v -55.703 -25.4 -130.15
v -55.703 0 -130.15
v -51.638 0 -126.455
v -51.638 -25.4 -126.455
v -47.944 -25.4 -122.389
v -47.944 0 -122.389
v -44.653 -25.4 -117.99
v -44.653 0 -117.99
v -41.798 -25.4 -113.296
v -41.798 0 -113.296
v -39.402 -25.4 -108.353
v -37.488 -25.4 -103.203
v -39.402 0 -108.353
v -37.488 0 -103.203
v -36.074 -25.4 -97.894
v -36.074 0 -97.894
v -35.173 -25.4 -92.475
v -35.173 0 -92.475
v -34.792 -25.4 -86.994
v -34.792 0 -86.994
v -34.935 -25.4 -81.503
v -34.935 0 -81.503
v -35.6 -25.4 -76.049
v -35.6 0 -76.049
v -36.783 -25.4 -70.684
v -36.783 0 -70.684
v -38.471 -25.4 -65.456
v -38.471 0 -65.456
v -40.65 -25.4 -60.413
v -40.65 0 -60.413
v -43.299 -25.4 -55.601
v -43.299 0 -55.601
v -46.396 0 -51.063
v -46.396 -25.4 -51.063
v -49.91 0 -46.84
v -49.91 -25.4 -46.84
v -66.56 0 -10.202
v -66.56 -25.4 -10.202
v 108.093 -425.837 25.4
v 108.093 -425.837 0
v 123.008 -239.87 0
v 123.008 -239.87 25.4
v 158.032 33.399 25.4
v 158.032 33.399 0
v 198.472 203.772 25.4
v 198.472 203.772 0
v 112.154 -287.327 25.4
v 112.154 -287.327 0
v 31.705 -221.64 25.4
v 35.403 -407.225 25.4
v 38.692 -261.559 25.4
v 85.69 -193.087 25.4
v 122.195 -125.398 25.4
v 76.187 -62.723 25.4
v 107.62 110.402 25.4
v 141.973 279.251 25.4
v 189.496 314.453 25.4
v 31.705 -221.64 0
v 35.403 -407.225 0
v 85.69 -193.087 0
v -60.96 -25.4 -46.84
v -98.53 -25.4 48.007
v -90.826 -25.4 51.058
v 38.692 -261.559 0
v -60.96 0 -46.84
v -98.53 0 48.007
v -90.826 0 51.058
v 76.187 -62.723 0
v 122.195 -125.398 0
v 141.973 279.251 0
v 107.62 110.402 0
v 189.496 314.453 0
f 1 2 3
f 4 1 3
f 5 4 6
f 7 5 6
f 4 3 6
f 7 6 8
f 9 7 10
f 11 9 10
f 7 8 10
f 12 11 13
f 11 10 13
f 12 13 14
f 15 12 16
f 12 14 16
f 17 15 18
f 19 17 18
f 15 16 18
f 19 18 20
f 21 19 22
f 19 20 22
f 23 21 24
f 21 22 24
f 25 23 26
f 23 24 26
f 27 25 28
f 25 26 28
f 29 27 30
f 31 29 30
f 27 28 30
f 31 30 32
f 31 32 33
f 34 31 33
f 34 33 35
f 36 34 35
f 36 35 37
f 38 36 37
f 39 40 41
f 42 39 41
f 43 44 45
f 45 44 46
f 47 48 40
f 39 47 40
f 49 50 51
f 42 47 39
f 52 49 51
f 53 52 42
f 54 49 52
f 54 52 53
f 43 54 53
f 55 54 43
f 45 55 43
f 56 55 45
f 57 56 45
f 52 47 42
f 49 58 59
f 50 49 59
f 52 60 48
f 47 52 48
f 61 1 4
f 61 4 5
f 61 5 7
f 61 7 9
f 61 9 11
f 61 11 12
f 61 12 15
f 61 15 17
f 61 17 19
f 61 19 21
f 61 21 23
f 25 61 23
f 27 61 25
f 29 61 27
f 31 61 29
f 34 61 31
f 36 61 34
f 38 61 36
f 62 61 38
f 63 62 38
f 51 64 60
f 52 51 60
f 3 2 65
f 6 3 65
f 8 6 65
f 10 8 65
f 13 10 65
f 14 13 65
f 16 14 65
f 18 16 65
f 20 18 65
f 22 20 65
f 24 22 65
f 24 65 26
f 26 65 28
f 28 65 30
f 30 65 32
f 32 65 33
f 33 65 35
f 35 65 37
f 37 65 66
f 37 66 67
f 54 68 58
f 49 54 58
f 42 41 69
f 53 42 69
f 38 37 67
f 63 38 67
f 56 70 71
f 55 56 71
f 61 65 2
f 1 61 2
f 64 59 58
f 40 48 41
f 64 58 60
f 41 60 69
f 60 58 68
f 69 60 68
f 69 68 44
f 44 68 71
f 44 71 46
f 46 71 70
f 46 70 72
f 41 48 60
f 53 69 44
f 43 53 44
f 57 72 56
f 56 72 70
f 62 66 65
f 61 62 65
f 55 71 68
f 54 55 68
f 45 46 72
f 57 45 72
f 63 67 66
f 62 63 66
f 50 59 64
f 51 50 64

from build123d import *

# Parameters (mm, degrees)
F1_DEPTH = 25.4
F3_DEPTH = 25.4


with BuildPart() as f1:
    # F0 (on Top) → F1 (new body)
    with BuildSketch(Plane.XY):
        Polygon((123.008274, -239.870414), (122.19511, -125.397533), (158.032253, 33.398684), (198.471949, 203.771606), (189.496323, 314.452678), (141.972825, 279.251069), (107.619673, 110.402279), (76.187298, -62.722787), (31.705081, -221.639857), (35.402518, -407.225162), (38.692296, -261.558563), (85.690096, -193.087429), (112.153806, -287.327021), (108.092964, -425.836921), align=None)
    extrude(amount=F1_DEPTH)


with BuildPart() as f3:
    # F2 (on Front) → F3 (new body)
    with BuildSketch(Plane.XZ):
        with BuildLine():
            Line((-66.559978, -10.202439), (-90.826385, 51.05846))
            Line((-90.826385, 51.05846), (-98.530347, 48.006799))
            Line((-98.530347, 48.006799), (-60.959959, -46.840195))
            Line((-60.959959, -46.840195), (-55.703185, -130.150378))
            ThreePointArc((-55.703185, -130.150378), (-34.916733, -89.739269), (-49.910188, -46.840195))
            Line((-49.910188, -46.840195), (-66.559978, -10.202439))
        make_face()
    extrude(amount=F3_DEPTH)


solid = Compound([f1.part, f3.part])
